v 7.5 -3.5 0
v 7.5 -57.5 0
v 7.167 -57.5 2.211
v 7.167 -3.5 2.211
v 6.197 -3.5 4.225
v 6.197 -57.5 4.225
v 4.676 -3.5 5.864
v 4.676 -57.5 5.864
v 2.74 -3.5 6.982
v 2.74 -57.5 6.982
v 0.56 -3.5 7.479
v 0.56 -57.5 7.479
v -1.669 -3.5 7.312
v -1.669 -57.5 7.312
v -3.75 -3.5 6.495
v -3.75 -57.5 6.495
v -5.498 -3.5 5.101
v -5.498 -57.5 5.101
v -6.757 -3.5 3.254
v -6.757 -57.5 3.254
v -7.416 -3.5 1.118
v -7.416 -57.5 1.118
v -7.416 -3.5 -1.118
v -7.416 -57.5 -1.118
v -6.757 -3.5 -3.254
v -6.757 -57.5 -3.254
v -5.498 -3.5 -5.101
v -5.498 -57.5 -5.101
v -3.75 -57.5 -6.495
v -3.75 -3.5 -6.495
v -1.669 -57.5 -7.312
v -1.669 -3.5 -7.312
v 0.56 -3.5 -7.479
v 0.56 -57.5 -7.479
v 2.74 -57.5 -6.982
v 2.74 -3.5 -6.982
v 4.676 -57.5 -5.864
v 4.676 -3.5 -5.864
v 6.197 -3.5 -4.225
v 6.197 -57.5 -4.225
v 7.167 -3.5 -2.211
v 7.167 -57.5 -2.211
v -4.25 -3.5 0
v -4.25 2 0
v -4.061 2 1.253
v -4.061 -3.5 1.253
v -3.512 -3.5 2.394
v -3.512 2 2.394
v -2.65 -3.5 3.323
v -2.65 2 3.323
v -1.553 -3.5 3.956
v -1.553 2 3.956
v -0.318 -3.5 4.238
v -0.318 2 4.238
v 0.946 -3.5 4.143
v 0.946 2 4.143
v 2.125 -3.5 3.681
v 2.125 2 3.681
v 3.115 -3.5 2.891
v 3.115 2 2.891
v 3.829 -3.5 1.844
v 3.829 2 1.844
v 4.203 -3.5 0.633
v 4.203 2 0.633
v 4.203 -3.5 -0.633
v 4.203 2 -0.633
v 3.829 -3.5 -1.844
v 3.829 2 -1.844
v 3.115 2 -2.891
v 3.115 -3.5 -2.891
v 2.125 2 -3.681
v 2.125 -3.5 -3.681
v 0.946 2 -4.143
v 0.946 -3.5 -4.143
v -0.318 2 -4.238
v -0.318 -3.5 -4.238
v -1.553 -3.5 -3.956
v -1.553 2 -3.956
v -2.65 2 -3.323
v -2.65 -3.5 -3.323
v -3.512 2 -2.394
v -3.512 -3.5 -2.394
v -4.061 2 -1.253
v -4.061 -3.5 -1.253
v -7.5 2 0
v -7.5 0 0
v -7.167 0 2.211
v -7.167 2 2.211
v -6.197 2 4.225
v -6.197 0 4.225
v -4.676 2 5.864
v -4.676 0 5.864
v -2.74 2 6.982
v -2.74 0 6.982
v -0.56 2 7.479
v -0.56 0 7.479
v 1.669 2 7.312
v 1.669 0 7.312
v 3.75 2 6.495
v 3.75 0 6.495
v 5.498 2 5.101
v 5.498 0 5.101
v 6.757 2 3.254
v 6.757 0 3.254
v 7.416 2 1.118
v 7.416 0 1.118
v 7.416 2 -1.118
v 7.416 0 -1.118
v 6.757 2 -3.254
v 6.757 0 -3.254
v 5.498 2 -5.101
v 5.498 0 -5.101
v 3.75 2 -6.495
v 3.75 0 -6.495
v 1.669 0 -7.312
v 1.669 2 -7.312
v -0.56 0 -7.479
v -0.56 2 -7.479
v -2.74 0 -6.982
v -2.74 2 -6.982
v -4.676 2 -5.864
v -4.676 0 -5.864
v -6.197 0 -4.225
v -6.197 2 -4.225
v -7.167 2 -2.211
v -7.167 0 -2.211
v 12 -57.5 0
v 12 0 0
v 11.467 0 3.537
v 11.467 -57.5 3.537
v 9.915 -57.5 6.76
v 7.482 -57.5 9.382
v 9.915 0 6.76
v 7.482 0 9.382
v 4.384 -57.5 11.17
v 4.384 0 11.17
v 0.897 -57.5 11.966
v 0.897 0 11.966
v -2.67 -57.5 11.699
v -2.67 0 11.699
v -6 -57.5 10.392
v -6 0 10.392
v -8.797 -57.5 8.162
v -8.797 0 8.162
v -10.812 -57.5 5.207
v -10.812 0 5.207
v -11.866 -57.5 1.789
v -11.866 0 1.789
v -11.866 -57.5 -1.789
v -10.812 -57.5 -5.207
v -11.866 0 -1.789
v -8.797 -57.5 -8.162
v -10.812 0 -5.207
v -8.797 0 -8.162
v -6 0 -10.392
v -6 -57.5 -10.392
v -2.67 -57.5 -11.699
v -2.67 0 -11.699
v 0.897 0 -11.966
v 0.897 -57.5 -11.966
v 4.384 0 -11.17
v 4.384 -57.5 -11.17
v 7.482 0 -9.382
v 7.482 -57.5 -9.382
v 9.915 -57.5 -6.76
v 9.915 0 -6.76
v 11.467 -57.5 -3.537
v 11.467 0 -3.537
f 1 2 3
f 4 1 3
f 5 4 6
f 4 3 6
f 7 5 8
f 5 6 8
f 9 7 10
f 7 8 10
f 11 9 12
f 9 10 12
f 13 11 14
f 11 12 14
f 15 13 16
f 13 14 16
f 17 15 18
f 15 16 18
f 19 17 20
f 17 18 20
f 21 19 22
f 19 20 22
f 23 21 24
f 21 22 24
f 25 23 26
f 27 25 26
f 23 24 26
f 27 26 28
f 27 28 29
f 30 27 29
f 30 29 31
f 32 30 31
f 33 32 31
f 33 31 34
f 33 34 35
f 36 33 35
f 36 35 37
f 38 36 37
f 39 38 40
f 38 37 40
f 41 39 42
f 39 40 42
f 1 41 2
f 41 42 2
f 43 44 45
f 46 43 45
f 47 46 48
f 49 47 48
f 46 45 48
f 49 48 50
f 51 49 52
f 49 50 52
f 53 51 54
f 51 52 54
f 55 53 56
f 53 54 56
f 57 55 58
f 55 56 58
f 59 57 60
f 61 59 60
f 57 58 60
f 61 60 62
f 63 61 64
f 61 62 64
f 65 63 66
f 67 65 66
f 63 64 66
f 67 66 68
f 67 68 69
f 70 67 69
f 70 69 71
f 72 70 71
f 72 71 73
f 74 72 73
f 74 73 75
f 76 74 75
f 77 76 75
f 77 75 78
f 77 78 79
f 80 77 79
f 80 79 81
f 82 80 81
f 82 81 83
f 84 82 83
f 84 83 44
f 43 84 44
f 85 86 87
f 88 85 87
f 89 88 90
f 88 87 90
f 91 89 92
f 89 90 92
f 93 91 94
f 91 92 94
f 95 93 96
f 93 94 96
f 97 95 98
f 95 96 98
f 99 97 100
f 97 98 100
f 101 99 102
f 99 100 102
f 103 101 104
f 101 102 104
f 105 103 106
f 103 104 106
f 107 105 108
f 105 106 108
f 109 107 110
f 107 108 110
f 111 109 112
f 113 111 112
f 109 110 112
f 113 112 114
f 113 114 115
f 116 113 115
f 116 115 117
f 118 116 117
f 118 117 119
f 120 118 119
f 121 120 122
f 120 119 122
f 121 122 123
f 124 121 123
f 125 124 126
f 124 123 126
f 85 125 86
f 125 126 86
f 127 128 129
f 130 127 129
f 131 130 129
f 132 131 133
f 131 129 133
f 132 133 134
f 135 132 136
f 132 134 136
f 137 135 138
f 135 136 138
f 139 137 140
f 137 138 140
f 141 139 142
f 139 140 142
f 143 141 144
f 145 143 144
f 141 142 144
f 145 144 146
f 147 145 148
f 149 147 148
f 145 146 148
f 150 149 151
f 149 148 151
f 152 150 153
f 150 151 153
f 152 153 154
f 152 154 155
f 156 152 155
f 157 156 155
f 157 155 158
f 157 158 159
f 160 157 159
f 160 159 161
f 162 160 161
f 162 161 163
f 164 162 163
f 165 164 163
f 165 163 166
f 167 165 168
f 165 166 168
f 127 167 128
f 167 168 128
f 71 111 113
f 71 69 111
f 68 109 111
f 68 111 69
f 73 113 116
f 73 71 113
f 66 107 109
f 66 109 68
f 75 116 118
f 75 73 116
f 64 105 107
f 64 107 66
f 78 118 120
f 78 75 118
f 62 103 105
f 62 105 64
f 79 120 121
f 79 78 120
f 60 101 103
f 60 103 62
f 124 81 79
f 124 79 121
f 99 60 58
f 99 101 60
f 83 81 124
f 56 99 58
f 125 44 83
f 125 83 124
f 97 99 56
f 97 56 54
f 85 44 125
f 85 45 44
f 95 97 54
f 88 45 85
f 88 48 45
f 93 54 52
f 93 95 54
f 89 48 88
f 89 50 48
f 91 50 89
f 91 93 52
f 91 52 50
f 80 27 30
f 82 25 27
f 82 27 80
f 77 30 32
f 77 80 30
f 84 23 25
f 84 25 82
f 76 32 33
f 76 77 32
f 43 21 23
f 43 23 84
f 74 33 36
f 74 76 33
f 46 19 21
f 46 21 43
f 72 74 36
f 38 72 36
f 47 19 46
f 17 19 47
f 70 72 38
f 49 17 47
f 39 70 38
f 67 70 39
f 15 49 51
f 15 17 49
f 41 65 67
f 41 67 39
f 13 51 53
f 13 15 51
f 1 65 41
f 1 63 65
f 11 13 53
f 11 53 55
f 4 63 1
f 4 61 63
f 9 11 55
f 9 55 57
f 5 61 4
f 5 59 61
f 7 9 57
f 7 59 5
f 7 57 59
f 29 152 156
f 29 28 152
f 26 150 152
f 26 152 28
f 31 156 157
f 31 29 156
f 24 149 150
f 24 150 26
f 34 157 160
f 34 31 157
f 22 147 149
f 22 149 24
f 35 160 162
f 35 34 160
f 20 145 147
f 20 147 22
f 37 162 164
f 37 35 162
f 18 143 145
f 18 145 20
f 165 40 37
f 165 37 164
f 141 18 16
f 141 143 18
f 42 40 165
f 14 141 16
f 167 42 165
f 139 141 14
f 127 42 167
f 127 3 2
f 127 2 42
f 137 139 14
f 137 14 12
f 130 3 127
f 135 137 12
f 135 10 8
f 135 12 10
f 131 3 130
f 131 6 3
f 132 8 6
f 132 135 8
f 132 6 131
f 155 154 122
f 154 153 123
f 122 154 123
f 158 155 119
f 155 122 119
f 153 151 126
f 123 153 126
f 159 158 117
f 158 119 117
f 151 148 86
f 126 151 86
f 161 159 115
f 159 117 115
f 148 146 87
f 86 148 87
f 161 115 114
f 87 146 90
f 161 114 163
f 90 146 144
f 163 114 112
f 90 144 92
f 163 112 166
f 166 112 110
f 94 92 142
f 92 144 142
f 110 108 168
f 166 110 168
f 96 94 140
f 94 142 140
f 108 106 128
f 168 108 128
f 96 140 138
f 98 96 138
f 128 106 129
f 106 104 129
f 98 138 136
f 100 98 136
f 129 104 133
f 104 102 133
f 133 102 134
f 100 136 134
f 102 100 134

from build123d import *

# Parameters (mm, degrees)
F0_R     = 12
F1_DEPTH = 57.5
F2_R     = 7.5
F3_DEPTH = 2
F4_R     = 7.5
F5_DEPTH = 54
F6_R     = 4.25
F7_DEPTH = 8


with BuildPart() as f1:
    # F0 (on Front) → F1 (new body)
    with BuildSketch(Plane.XZ):
        Circle(F0_R)
    extrude(amount=F1_DEPTH)

    # F2 (on face) → F3 (join)
    with BuildSketch(Plane(origin=(0, 0, 0), x_dir=(-1, 0, 0), z_dir=(0, 1, 0))):
        Circle(F2_R)
    extrude(amount=F3_DEPTH)

    # F4 (on face) → F5 (cut)
    with BuildSketch(Plane.XZ.offset(57.5)):
        Circle(F4_R)
    extrude(amount=-F5_DEPTH, mode=Mode.SUBTRACT)

    # F6 (on face) → F7 (cut)
    with BuildSketch(Plane(origin=(0, 2, 0), x_dir=(-1, 0, 0), z_dir=(0, 1, 0))):
        Circle(F6_R)
    extrude(amount=-F7_DEPTH, mode=Mode.SUBTRACT)


solid = f1.part
